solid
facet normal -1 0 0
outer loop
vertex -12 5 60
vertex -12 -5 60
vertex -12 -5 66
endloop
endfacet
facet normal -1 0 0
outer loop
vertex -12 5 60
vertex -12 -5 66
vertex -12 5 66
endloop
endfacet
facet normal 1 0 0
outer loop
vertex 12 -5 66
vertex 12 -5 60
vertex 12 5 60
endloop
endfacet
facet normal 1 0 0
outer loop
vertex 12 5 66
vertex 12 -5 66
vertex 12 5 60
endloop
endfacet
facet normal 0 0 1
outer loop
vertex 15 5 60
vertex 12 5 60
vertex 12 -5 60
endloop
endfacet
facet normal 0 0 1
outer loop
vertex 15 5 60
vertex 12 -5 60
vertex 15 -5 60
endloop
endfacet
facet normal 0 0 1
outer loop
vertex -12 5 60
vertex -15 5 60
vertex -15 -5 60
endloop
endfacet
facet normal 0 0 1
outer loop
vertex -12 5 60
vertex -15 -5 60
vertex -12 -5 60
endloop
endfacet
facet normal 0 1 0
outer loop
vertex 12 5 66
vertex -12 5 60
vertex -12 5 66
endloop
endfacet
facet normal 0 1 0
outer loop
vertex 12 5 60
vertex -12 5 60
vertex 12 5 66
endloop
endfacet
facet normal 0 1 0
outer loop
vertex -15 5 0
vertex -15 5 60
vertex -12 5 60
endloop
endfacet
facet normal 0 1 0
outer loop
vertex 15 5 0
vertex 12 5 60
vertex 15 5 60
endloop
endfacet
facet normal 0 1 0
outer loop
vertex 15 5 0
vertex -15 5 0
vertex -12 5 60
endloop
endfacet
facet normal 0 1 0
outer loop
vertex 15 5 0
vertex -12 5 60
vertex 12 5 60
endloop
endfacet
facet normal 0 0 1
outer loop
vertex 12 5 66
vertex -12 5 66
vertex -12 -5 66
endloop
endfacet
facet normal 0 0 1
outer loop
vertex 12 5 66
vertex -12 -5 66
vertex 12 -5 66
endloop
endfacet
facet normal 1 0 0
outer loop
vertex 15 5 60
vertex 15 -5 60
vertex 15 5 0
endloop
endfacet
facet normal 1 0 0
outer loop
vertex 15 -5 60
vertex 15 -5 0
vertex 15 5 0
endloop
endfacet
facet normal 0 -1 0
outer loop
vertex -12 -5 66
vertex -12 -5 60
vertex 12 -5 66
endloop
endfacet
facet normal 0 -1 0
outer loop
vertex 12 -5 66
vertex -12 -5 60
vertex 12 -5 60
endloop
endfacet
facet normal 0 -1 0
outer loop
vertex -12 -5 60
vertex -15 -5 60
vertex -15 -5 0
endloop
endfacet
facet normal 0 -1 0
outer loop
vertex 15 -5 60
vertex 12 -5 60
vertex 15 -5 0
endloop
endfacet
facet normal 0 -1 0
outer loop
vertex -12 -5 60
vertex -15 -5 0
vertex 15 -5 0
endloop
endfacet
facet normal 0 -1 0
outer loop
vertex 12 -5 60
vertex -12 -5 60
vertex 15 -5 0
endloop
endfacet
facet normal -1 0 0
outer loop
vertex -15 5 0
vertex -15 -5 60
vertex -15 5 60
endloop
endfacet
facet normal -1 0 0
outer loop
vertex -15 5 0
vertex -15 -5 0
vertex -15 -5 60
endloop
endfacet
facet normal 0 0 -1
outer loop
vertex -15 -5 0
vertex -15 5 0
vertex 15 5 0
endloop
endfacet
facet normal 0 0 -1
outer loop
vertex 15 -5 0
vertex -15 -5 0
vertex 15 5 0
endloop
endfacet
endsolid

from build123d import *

# Parameters (mm, degrees)
F0_W     = 30
F0_H     = 10
F1_DEPTH = 40
F2_W     = 30
F2_H     = 10
F3_DEPTH = 20
F4_W     = 24
F4_H     = 10
F5_DEPTH = 6


with BuildPart() as f1:
    # F0 (on Top) → F1 (new body)
    with BuildSketch(Plane.XY):
        Rectangle(F0_W, F0_H)
    extrude(amount=F1_DEPTH)

    # F2 (on face) → F3 (join)
    with BuildSketch(Plane.XY.offset(40)):
        Rectangle(F2_W, F2_H)
    extrude(amount=F3_DEPTH)

    # F4 (on face) → F5 (join)
    with BuildSketch(Plane.XY.offset(60)):
        Rectangle(F4_W, F4_H)
    extrude(amount=F5_DEPTH)


solid = f1.part
